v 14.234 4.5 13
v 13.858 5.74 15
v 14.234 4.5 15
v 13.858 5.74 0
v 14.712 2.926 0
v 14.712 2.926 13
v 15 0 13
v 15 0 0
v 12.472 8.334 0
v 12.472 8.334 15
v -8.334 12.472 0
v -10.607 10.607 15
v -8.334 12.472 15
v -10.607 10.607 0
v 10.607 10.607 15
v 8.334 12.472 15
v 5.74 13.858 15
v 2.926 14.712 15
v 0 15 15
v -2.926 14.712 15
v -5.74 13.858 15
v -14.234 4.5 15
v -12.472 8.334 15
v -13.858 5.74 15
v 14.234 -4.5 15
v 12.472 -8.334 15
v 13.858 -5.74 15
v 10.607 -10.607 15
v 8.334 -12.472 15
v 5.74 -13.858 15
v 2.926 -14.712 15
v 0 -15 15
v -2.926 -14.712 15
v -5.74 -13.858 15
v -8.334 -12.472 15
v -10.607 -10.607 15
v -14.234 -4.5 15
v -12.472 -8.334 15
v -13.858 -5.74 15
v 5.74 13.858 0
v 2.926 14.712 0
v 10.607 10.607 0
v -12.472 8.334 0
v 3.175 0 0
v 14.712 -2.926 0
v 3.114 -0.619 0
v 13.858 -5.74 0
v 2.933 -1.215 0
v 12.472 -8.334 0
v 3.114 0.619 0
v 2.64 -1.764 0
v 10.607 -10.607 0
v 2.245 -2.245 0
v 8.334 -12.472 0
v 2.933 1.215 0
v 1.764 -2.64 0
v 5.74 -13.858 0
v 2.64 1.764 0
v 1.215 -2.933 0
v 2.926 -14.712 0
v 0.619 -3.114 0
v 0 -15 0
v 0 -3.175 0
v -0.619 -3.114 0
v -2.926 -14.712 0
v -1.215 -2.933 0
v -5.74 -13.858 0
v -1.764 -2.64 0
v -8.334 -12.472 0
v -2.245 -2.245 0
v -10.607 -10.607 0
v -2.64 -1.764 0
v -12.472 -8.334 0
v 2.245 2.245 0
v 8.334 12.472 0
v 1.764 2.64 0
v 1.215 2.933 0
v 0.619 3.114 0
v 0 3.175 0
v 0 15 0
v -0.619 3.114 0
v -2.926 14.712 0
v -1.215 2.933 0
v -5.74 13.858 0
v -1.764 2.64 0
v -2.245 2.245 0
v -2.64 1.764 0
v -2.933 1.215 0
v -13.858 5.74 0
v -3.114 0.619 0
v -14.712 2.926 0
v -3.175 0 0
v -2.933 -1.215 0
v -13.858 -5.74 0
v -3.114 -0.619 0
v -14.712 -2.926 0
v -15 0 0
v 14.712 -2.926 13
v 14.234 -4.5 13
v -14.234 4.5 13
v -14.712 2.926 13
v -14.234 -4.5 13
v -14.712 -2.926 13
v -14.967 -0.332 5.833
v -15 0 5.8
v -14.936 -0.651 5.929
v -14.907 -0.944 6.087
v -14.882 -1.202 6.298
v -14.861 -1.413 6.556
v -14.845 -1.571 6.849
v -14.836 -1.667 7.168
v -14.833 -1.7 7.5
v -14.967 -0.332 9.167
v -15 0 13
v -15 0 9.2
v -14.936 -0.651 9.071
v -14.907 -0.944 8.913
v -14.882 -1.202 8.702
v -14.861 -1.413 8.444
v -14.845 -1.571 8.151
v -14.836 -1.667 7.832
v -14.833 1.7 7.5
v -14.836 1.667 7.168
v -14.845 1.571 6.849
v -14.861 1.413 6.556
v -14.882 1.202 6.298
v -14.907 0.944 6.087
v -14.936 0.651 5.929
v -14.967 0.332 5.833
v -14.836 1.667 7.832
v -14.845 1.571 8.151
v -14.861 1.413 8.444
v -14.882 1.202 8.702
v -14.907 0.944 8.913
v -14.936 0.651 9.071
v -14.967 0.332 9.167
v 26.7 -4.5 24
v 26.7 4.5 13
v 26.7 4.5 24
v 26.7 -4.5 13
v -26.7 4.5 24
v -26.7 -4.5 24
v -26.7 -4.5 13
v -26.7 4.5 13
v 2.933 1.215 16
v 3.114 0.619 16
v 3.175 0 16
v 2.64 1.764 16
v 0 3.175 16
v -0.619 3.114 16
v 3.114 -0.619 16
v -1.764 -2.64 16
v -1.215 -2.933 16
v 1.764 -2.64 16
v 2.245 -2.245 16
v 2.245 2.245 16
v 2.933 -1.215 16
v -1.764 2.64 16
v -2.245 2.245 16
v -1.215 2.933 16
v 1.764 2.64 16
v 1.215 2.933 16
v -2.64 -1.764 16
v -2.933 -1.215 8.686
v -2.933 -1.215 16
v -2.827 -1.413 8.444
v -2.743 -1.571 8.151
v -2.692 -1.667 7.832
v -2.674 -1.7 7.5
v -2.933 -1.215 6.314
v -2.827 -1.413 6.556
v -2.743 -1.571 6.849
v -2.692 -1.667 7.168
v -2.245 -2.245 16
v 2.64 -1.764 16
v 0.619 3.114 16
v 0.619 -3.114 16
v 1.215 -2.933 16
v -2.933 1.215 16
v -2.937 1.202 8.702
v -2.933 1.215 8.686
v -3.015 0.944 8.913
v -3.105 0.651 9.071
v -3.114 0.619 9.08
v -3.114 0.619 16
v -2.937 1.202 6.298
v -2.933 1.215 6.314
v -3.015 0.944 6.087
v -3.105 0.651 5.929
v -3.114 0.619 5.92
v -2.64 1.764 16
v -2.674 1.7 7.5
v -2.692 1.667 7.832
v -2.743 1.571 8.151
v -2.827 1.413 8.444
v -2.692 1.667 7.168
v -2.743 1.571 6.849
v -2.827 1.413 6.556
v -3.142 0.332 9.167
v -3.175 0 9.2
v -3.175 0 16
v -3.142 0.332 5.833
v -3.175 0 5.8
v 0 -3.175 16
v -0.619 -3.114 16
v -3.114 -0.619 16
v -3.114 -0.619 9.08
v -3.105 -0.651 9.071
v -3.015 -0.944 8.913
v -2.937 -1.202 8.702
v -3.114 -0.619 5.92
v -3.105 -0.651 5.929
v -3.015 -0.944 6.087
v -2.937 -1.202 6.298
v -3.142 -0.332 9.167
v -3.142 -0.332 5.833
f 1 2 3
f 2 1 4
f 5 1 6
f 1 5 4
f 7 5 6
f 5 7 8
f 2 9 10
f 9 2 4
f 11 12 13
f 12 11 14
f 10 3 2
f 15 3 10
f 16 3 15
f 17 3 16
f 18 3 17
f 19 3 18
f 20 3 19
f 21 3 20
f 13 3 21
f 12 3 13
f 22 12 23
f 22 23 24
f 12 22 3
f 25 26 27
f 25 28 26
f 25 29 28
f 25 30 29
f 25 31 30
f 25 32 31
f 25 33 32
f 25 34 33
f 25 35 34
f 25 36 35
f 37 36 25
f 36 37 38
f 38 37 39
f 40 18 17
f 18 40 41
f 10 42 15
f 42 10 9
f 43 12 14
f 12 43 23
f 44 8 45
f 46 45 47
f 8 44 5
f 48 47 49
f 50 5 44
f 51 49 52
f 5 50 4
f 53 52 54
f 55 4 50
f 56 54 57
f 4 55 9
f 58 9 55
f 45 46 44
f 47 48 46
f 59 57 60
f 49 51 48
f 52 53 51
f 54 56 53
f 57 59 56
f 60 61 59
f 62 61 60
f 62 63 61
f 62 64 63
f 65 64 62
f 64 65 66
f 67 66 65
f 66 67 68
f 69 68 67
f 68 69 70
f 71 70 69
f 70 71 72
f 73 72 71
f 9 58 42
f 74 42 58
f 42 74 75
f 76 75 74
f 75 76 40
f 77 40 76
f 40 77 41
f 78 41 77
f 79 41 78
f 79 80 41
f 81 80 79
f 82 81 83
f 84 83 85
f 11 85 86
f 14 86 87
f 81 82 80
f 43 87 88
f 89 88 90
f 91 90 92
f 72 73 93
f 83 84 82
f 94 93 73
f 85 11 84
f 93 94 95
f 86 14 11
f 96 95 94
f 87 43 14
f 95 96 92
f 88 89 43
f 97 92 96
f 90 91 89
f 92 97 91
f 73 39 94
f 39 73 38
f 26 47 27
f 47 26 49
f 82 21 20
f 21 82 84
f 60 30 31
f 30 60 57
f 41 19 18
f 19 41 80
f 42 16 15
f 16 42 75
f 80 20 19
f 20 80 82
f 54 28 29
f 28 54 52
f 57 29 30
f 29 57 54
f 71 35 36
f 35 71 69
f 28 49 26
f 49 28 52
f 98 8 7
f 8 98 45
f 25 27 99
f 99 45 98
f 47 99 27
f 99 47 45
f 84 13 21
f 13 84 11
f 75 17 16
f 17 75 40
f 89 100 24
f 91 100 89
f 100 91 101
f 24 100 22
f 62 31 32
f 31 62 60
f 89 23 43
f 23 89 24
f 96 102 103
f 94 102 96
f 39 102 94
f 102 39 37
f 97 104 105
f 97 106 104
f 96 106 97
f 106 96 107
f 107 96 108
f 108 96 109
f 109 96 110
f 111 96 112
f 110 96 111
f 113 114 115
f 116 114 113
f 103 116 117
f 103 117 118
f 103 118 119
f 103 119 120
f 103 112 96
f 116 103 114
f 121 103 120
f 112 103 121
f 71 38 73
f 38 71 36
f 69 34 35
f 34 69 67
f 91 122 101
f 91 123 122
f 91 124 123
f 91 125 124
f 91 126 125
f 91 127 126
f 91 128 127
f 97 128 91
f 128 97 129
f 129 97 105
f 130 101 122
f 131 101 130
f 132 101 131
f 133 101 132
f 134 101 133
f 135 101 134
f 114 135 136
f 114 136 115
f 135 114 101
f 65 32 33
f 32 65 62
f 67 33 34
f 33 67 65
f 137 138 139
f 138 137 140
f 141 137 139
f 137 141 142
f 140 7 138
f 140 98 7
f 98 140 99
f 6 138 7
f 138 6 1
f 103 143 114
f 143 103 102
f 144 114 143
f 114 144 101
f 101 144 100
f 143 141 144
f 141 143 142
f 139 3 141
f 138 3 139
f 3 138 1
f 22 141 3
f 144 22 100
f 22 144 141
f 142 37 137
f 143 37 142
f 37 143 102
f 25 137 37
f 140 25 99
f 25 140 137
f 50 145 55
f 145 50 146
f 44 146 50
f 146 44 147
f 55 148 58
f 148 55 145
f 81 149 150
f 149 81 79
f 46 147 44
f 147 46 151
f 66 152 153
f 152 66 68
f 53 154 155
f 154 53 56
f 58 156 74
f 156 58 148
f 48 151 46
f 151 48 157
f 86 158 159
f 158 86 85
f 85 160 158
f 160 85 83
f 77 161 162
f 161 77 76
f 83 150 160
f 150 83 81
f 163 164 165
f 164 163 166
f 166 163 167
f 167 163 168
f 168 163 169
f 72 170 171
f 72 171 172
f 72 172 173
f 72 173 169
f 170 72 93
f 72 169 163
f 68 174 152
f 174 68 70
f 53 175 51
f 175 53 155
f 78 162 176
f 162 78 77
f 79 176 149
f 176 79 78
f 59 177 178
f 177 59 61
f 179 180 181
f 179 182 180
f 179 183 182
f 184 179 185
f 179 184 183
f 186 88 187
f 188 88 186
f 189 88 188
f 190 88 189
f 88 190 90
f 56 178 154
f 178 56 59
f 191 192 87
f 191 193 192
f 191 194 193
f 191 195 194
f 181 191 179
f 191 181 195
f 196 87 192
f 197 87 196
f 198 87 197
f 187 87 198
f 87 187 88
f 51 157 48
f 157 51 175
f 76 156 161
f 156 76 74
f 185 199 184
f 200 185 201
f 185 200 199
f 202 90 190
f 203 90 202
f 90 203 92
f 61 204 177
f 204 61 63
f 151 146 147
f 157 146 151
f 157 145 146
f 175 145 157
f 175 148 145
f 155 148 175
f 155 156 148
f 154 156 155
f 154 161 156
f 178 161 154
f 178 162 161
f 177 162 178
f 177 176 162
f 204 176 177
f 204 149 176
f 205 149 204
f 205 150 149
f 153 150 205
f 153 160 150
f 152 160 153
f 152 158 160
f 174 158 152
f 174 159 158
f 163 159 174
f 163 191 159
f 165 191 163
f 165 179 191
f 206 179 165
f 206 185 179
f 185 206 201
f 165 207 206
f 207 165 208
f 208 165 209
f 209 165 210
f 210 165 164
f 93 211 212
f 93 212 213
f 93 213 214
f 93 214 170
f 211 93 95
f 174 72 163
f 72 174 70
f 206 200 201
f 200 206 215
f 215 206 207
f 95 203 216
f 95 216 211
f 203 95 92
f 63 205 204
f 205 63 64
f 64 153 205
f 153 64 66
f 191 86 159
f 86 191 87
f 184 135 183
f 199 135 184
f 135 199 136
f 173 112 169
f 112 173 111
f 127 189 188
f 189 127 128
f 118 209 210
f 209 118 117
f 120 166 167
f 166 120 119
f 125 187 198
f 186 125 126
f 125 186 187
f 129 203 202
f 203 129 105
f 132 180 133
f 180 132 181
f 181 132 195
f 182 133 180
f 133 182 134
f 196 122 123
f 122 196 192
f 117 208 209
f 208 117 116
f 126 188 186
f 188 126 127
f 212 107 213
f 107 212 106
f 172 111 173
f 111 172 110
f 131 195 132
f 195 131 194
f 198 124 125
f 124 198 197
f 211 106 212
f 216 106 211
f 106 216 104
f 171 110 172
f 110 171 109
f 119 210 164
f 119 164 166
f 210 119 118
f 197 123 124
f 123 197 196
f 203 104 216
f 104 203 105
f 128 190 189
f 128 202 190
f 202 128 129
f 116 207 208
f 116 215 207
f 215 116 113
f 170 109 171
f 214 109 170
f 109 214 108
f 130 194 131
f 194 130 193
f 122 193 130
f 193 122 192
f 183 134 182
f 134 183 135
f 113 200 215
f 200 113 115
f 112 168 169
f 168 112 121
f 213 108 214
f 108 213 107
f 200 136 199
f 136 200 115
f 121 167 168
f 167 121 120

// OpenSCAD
$fn = 32;

// ----------------------------------------------------------------------
// Hand knob: 30 x 53.4 x 15 mm
// ----------------------------------------------------------------------

// --- parameters (mm) ---
grip_d = 30;              // knob diameter
grip_h = 15;              // knob height
shaft_d = 6.35;           // shaft bore
set_d = 3.4;              // set screw tap hole
wing_l = 53.4;            // wing span
wing_w = 9;               // wing width
wing_h = 9;               // wing thickness

module body() {
  cylinder(h = grip_h, d = grip_d);
}

module wing() {
  /* wing sunk 2 mm into the knob so the joint overlaps */
  translate([-wing_l / 2, -wing_w / 2, grip_h - 2])
    cube([wing_l, wing_w, wing_h + 2]);
}

difference() {
  union() {
    body();
    wing();
  }
  translate([0, 0, -1]) cylinder(h = grip_h + 0 + 2, d = shaft_d);
  translate([-grip_d / 2 - 1, 0, grip_h * 0.5]) rotate([0, 90, 0]) cylinder(h = grip_d / 2 + 2, d = set_d);
}
